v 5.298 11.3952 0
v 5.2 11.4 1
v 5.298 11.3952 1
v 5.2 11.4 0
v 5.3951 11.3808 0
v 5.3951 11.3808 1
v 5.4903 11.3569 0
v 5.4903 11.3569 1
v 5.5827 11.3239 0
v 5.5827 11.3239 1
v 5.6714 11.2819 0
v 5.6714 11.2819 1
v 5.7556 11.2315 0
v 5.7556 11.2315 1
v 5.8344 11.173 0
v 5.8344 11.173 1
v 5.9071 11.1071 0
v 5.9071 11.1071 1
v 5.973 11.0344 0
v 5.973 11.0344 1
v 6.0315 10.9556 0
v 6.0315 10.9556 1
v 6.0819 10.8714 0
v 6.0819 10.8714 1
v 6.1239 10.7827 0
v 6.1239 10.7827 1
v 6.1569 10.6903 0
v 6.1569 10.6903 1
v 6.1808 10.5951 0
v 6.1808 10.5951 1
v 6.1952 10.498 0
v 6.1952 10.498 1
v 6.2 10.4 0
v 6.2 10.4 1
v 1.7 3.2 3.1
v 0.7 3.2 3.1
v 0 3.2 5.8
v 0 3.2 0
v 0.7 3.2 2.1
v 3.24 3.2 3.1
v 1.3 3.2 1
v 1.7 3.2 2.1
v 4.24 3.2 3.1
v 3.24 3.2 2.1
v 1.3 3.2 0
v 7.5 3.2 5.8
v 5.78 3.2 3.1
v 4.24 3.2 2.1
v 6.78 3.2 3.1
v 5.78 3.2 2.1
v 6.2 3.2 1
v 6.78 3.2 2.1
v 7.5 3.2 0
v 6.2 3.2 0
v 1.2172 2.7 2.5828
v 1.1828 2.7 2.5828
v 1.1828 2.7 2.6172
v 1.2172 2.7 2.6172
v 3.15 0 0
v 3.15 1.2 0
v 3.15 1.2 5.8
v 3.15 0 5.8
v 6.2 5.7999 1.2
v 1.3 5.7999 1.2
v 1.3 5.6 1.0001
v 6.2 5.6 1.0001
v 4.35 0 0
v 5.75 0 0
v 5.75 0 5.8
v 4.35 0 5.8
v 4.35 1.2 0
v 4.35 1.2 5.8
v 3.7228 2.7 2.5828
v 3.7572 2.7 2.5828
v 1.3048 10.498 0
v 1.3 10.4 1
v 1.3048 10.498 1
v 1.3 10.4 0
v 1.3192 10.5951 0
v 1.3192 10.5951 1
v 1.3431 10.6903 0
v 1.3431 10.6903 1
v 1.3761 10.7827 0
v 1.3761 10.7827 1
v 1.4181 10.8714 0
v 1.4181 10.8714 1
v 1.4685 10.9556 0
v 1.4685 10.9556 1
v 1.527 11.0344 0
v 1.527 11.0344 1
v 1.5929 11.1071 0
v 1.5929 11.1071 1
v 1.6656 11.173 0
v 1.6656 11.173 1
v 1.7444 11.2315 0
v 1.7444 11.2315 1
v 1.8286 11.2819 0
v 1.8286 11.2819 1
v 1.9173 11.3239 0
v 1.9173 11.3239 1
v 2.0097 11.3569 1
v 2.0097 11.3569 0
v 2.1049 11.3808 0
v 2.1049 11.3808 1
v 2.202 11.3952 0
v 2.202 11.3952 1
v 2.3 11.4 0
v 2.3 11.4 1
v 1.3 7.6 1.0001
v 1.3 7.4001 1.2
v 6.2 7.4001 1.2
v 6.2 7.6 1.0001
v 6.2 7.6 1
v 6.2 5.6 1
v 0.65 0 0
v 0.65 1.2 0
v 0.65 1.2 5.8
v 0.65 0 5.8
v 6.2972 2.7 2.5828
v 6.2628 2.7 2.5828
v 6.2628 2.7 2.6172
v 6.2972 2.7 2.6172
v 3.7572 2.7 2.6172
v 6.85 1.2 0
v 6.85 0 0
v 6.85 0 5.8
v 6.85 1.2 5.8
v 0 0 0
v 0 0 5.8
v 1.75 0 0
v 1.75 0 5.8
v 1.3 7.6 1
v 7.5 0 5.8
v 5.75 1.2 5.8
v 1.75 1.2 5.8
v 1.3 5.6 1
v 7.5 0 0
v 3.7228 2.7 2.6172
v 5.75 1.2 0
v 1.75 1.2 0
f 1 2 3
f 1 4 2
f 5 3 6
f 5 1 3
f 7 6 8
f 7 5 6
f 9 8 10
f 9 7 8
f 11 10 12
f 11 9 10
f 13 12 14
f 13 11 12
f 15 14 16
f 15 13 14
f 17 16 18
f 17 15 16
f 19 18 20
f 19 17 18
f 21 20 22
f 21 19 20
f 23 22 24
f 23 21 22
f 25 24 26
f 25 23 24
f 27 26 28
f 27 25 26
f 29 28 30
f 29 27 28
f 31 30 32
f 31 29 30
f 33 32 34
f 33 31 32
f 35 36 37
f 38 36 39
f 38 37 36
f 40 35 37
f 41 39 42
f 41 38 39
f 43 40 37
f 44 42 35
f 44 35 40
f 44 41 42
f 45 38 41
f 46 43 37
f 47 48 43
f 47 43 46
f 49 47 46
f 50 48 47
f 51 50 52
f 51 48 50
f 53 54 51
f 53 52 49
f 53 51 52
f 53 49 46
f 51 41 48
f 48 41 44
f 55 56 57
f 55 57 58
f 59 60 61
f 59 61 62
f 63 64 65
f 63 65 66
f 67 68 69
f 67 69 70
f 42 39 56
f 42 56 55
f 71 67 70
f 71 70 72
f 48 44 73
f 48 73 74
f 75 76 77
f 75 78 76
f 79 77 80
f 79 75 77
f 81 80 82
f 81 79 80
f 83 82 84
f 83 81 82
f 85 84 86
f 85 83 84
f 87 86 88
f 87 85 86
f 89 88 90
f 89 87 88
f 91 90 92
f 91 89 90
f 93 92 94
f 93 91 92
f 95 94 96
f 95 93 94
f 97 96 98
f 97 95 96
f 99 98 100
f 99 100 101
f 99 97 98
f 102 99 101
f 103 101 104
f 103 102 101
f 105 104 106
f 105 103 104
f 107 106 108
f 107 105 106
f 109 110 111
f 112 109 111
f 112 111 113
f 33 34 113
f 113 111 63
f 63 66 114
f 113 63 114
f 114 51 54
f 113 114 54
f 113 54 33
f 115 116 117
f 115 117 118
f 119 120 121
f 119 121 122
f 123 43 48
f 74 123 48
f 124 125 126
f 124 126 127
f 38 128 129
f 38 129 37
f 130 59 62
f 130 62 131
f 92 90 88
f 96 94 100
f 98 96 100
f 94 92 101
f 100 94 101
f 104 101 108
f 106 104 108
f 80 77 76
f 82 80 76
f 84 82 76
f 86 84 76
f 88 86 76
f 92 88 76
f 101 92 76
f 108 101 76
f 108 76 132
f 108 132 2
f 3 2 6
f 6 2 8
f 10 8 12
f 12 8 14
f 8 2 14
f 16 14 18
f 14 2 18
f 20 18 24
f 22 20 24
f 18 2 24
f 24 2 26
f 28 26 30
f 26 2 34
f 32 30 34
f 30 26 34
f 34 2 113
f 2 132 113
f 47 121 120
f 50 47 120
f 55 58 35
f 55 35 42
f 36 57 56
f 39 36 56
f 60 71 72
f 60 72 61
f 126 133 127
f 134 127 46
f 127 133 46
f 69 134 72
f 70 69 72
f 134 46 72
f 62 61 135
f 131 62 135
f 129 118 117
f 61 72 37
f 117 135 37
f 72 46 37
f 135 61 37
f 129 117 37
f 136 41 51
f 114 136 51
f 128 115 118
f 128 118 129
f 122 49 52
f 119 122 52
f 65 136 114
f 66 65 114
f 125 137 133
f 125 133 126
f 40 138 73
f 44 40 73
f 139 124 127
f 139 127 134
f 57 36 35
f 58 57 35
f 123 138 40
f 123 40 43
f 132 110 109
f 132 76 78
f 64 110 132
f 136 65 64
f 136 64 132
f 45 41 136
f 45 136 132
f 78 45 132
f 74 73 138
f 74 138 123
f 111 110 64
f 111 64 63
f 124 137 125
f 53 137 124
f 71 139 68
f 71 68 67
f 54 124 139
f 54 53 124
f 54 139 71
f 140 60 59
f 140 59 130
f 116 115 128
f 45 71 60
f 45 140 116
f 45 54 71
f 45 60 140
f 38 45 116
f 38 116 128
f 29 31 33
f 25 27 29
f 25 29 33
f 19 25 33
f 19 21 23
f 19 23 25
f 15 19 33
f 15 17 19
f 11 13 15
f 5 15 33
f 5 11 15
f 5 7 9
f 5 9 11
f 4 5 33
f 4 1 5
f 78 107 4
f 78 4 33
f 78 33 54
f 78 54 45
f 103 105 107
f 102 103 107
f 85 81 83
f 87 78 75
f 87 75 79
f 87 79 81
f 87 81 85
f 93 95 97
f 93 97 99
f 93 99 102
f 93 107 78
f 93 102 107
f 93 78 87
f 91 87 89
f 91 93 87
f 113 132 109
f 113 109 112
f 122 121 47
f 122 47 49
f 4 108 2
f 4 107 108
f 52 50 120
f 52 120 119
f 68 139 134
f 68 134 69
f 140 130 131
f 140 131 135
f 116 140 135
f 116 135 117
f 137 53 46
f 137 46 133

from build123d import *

# Parameters (mm, degrees)
EXTRUDE_1_DEPTH                  = 5.8
SKETCH_2_W                       = 4.9
SKETCH_2_H                       = 1
EXTRUDE_2_DEPTH                  = 8.2
SKETCH_3_W                       = 4.9
SKETCH_3_H                       = 2
EXTRUDE_3_DEPTH                  = 0.2
CHAMFER_1_SIZE                   = 0.2
FILLET_1_R                       = 1
SKETCH_4_W                       = 1
SKETCH_4_H                       = 1
CUT_EXTRUDE_1_DEPTH              = 0.5
CUT_EXTRUDE_1_DRAFT              = -44
PATTERN_LINEAR_1_COPY_1_SKETCH_W = 1
PATTERN_LINEAR_1_COPY_1_SKETCH_H = 1
PATTERN_LINEAR_1_COPY_1_DEPTH    = 0.5
PATTERN_LINEAR_1_COPY_1_DRAFT    = -44
PATTERN_LINEAR_1_COPY_2_SKETCH_W = 1
PATTERN_LINEAR_1_COPY_2_SKETCH_H = 1
PATTERN_LINEAR_1_COPY_2_DEPTH    = 0.5
PATTERN_LINEAR_1_COPY_2_DRAFT    = -44


with BuildPart() as part:
    # Эскиз1 → Бобышка-Вытянуть1 (new body)
    with BuildSketch(Plane.XY):
        Polygon((0, 0), (0, 3.2), (7.5, 3.2), (7.5, 0), (6.85, 0), (6.85, 1.2), (5.75, 1.2), (5.75, 0), (4.35, 0), (4.35, 1.2), (3.15, 1.2), (3.15, 0), (1.75, 0), (1.75, 1.2), (0.65, 1.2), (0.65, 0), align=None)
    extrude(amount=EXTRUDE_1_DEPTH)

    # Эскиз2 → Бобышка-Вытянуть2 (add)
    with BuildSketch(Plane(origin=(0, 3.2, 0), x_dir=(1, 0, 0), z_dir=(0, 1, 0))):
        with Locations((3.75, -0.5)):
            Rectangle(SKETCH_2_W, SKETCH_2_H)
    extrude(amount=EXTRUDE_2_DEPTH)

    # Эскиз3 → Бобышка-Вытянуть3 (add)
    with BuildSketch(Plane.XY.offset(1)):
        with Locations((3.75, 6.6)):
            Rectangle(SKETCH_3_W, SKETCH_3_H)
    extrude(amount=EXTRUDE_3_DEPTH)

    # Фаска1
    chamfer_1_edges = [part.edges().sort_by_distance(p)[0] for p in [
        (3.75, 5.6, 1.2),
        (3.75, 7.6, 1.2),
    ]]
    chamfer(chamfer_1_edges, length=CHAMFER_1_SIZE - 0.0001)  # a hair under: the kernel refuses the full size

    # Скругление1
    fillet_1_edges = [part.edges().sort_by_distance(p)[0] for p in [
        (1.3, 11.4, 0.5),
        (6.2, 11.4, 0.5),
    ]]
    fillet(fillet_1_edges, radius=FILLET_1_R)


with BuildPart() as cut_extrude_1_tool:
    # Эскиз4 → Вырез-Вытянуть1 (with draft: the straight prism first)
    with BuildSketch(Plane(origin=(0, 3.2, 0), x_dir=(1, 0, 0), z_dir=(0, 1, 0))):
        with Locations((1.2, -2.6)):
            Rectangle(SKETCH_4_W, SKETCH_4_H)
    extrude(amount=-CUT_EXTRUDE_1_DEPTH)
    # Вырез-Вытянуть1: the draft: its side faces are tilted about the plane it starts from
    cut_extrude_1_sides = [cut_extrude_1_tool.faces().sort_by_distance(p)[0] for p in [
        (0.7, 2.95, 2.6),
        (1.2, 2.95, 3.1),
        (1.7, 2.95, 2.6),
        (1.2, 2.95, 2.1),
    ]]
    draft(cut_extrude_1_sides, Plane(origin=(0, 3.2, 0), x_dir=(1, 0, 0), z_dir=(0, 1, 0)), CUT_EXTRUDE_1_DRAFT)


with BuildPart() as part_1:
    add(part.part)

    # Вырез-Вытянуть1: cut by cut_extrude_1_tool
    add(cut_extrude_1_tool.part, mode=Mode.SUBTRACT)


with BuildPart() as pattern_linear_1_copy_1_tool:
    # Линейный массив1 copy 1 sketch → Линейный массив1 copy 1 (with draft: the straight prism first)
    with BuildSketch(Plane(origin=(2.54, 3.2, 0), x_dir=(1, 0, 0), z_dir=(0, 1, 0))):
        with Locations((1.2, -2.6)):
            Rectangle(PATTERN_LINEAR_1_COPY_1_SKETCH_W, PATTERN_LINEAR_1_COPY_1_SKETCH_H)
    extrude(amount=-PATTERN_LINEAR_1_COPY_1_DEPTH)
    # Линейный массив1 copy 1: the draft: its side faces are tilted about the plane it starts from
    pattern_linear_1_copy_1_sides = [pattern_linear_1_copy_1_tool.faces().sort_by_distance(p)[0] for p in [
        (3.24, 2.95, 2.6),
        (3.74, 2.95, 3.1),
        (4.24, 2.95, 2.6),
        (3.74, 2.95, 2.1),
    ]]
    draft(pattern_linear_1_copy_1_sides, Plane(origin=(2.54, 3.2, 0), x_dir=(1, 0, 0), z_dir=(0, 1, 0)), PATTERN_LINEAR_1_COPY_1_DRAFT)


with BuildPart() as part_2:
    add(part_1.part)

    # Линейный массив1 copy 1: cut by pattern_linear_1_copy_1_tool
    add(pattern_linear_1_copy_1_tool.part, mode=Mode.SUBTRACT)


with BuildPart() as pattern_linear_1_copy_2_tool:
    # Линейный массив1 copy 2 sketch → Линейный массив1 copy 2 (with draft: the straight prism first)
    with BuildSketch(Plane(origin=(5.08, 3.2, 0), x_dir=(1, 0, 0), z_dir=(0, 1, 0))):
        with Locations((1.2, -2.6)):
            Rectangle(PATTERN_LINEAR_1_COPY_2_SKETCH_W, PATTERN_LINEAR_1_COPY_2_SKETCH_H)
    extrude(amount=-PATTERN_LINEAR_1_COPY_2_DEPTH)
    # Линейный массив1 copy 2: the draft: its side faces are tilted about the plane it starts from
    pattern_linear_1_copy_2_sides = [pattern_linear_1_copy_2_tool.faces().sort_by_distance(p)[0] for p in [
        (5.78, 2.95, 2.6),
        (6.28, 2.95, 3.1),
        (6.78, 2.95, 2.6),
        (6.28, 2.95, 2.1),
    ]]
    draft(pattern_linear_1_copy_2_sides, Plane(origin=(5.08, 3.2, 0), x_dir=(1, 0, 0), z_dir=(0, 1, 0)), PATTERN_LINEAR_1_COPY_2_DRAFT)


with BuildPart() as part_3:
    add(part_2.part)

    # Линейный массив1 copy 2: cut by pattern_linear_1_copy_2_tool
    add(pattern_linear_1_copy_2_tool.part, mode=Mode.SUBTRACT)


solid = part_3.part
